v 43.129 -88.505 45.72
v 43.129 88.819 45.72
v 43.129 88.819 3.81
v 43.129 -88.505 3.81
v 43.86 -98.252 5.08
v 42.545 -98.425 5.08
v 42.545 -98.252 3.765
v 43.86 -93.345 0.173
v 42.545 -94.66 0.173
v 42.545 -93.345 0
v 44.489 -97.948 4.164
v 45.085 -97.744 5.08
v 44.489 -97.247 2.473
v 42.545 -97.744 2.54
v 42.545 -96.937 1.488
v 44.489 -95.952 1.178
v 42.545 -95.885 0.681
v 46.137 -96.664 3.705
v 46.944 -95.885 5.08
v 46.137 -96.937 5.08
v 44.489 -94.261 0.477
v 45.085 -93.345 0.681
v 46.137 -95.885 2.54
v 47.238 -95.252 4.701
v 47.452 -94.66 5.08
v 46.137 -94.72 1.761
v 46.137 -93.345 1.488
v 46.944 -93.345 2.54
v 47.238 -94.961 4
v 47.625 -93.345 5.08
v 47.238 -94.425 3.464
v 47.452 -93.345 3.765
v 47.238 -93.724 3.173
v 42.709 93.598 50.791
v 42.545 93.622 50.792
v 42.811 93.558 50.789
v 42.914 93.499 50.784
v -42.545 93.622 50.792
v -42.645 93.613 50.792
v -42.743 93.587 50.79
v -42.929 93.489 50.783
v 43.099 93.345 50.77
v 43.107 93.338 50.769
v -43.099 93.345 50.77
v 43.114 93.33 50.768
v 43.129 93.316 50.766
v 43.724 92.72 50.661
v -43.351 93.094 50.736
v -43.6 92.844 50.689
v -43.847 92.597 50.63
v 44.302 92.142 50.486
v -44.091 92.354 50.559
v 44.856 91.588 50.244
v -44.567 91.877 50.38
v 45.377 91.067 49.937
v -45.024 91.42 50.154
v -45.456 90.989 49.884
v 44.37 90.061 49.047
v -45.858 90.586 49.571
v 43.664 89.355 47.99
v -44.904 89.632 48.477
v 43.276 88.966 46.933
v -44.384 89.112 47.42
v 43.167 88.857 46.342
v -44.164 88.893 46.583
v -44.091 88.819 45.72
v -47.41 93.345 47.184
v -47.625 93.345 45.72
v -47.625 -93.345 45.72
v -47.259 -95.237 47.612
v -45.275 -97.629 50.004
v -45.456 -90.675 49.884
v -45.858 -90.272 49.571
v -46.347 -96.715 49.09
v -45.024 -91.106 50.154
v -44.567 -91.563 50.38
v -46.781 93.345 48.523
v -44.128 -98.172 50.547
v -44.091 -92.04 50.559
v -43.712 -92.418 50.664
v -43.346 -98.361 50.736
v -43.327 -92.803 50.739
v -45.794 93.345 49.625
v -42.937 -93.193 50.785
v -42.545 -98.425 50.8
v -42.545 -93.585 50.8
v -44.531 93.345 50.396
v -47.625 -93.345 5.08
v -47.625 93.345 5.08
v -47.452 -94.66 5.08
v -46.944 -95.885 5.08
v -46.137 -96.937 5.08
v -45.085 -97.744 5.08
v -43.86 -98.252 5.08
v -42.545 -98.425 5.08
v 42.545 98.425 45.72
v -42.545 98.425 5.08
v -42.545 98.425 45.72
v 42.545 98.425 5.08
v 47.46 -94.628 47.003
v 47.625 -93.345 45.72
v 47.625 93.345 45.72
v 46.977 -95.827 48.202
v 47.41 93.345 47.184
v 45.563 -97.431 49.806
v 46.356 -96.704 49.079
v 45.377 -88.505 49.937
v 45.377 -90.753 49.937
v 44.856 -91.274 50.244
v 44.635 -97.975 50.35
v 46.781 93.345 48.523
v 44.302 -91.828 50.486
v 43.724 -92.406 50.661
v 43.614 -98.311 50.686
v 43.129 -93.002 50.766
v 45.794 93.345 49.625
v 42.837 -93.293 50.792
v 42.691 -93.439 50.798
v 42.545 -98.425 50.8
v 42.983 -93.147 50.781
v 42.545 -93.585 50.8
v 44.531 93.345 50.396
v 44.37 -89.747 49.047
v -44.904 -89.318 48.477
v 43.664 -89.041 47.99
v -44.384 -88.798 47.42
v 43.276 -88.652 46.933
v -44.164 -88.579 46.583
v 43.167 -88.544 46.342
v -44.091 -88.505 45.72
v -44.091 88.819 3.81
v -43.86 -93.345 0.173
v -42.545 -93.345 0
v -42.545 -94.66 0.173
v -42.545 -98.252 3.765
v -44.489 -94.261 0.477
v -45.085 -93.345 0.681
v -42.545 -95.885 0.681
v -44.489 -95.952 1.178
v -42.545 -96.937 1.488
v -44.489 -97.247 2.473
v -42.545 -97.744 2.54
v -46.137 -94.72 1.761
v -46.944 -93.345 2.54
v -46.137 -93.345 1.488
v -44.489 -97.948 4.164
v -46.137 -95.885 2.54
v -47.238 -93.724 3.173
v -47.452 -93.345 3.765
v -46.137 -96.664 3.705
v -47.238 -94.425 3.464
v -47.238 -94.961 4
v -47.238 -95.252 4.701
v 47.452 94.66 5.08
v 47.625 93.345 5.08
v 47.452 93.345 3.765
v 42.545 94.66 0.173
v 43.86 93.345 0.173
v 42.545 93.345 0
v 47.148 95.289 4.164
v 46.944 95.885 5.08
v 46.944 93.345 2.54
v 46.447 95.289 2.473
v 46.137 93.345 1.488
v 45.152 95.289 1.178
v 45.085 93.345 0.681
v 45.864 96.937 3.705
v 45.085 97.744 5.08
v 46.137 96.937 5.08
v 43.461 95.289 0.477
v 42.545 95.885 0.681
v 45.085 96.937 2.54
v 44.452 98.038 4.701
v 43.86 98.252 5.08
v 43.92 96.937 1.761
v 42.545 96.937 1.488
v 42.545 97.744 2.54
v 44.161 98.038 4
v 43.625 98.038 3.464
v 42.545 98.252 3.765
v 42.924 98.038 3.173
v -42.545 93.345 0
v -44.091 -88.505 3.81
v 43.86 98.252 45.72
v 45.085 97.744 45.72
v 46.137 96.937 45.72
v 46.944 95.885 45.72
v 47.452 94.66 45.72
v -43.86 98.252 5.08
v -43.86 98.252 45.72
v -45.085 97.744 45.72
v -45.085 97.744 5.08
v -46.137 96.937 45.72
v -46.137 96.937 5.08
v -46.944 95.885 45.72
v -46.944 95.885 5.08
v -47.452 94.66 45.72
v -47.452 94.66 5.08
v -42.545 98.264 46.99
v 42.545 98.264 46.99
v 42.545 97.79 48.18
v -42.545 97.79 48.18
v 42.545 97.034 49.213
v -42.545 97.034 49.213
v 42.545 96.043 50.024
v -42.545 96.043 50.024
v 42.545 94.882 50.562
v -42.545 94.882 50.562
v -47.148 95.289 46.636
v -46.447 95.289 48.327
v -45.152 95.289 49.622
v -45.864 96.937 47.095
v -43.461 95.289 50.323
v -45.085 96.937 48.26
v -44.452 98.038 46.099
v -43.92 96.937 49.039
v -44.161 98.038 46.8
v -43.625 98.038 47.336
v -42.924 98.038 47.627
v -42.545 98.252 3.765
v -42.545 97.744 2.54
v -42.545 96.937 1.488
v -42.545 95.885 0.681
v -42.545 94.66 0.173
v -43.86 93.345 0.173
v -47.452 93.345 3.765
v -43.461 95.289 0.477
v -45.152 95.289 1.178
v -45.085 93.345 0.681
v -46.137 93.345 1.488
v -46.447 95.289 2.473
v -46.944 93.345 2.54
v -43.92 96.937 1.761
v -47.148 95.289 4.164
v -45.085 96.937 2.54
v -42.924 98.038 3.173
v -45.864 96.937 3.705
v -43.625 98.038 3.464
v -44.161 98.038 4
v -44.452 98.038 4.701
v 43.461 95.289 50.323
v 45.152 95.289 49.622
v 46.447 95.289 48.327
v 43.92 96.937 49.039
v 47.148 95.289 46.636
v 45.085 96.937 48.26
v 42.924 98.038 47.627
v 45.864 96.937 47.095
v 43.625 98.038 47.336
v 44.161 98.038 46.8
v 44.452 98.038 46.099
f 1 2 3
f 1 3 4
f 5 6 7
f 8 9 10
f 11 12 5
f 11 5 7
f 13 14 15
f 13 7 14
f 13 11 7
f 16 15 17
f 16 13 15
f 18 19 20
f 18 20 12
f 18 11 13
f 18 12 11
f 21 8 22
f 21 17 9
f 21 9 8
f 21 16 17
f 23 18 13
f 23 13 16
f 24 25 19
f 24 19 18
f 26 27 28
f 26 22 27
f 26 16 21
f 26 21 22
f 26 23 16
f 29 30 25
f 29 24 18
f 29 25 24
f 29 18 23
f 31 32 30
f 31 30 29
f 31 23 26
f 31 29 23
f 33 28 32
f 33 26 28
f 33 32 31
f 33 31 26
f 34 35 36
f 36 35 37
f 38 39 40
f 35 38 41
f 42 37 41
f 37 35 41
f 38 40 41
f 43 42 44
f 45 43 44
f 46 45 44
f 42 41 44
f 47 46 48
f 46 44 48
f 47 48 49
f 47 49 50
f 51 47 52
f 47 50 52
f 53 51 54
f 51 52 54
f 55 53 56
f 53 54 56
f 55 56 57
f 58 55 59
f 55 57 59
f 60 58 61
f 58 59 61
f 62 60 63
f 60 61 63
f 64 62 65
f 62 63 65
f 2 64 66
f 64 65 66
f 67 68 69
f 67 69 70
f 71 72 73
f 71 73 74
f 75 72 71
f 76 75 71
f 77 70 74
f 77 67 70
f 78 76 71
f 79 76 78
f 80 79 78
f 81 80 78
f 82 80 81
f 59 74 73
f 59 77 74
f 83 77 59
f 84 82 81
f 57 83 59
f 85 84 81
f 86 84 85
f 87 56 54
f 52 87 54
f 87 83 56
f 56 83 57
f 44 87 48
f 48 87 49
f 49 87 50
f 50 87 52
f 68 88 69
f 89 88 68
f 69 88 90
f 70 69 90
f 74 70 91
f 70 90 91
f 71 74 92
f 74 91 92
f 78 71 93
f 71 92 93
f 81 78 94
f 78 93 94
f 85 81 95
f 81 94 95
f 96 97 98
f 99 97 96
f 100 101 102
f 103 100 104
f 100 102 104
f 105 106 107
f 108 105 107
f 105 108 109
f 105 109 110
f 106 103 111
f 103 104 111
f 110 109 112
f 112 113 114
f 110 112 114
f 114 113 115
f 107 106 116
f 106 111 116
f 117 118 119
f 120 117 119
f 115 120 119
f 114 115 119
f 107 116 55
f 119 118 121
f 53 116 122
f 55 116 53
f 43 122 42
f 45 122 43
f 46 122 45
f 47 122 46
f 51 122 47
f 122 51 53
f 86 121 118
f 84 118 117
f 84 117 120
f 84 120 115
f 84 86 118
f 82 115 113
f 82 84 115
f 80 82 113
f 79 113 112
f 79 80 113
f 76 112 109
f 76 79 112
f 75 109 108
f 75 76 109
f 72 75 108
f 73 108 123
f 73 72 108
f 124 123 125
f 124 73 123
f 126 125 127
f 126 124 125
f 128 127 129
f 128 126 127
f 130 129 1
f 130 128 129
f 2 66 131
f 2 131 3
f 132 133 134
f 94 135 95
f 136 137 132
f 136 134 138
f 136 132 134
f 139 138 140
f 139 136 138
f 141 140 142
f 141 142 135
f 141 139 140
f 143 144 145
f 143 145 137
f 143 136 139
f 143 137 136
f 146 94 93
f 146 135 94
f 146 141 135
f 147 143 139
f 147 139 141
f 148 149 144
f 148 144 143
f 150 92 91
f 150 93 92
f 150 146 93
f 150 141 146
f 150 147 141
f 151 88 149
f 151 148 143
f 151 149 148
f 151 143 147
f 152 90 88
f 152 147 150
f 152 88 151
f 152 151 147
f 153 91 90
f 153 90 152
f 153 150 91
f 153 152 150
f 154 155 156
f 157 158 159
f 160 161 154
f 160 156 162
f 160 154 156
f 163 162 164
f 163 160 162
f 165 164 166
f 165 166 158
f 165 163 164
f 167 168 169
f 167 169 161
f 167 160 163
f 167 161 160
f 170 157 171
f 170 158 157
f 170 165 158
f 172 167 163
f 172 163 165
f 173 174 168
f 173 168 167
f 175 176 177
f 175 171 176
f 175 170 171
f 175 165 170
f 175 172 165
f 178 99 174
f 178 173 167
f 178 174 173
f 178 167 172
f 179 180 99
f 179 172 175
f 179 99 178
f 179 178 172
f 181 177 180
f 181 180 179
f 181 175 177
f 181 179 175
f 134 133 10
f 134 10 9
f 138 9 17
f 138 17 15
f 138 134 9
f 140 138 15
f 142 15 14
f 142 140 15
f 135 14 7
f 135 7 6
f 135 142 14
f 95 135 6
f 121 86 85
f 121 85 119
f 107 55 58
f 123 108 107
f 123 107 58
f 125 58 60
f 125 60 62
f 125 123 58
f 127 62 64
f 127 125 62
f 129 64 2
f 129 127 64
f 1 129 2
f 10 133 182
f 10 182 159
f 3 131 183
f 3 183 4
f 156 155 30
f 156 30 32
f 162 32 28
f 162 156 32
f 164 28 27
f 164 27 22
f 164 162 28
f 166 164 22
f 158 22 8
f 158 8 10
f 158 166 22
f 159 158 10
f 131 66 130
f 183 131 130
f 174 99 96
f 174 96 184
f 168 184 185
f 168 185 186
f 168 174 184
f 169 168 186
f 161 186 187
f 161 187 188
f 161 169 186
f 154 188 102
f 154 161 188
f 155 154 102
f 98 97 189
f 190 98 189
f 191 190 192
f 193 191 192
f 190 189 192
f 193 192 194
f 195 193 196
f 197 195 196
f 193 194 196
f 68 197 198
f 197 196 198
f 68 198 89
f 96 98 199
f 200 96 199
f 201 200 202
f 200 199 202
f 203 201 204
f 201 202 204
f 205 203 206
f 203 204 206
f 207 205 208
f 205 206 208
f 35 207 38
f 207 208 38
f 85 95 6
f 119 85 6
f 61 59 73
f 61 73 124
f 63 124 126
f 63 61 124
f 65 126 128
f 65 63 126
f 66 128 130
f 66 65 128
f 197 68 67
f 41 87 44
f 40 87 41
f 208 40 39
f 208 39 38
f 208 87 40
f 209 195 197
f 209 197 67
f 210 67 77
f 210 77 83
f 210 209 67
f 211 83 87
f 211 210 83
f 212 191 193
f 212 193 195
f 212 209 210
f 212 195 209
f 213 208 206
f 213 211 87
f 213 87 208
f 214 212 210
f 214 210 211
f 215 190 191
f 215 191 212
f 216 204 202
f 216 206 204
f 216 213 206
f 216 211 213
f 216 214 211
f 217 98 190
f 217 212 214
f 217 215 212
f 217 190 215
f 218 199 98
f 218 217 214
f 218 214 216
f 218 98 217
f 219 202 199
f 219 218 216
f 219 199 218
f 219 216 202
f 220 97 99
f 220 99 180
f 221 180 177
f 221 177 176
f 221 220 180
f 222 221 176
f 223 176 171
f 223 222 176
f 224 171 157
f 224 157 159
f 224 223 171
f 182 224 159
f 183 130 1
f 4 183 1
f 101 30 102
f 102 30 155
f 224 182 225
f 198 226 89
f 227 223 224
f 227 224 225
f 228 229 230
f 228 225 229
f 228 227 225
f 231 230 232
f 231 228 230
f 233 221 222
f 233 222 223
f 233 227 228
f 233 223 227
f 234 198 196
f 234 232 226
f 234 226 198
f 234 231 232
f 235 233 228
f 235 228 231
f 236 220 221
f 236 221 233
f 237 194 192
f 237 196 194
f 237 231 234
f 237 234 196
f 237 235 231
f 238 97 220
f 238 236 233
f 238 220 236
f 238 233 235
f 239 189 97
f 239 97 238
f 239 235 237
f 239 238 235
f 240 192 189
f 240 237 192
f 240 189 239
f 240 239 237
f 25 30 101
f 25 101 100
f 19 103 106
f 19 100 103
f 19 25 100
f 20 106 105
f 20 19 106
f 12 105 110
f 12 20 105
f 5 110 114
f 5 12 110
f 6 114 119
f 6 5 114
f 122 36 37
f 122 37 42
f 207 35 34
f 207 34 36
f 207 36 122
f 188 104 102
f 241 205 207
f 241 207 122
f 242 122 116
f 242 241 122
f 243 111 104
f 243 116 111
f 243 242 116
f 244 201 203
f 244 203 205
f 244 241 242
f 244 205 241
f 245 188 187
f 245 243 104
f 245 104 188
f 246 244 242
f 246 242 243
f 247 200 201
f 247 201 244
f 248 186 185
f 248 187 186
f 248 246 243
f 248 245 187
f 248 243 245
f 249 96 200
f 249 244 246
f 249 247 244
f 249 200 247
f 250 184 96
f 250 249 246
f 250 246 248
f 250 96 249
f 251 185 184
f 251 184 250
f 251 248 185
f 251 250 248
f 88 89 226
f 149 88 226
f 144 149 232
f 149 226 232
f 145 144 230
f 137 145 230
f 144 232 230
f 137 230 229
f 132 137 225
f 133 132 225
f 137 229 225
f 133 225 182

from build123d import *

# Parameters (mm, degrees)
F0_W          = 95.25
F0_H          = 196.85
F1_DEPTH      = 50.8
F2_W          = 87.2193016112
F2_H          = 177.3245334625
F3_DEPTH      = 46.99
F4_T1_DEPTH   = 204.47
F4_T3_DEPTH   = 85.09
F4_T5_DEPTH   = 40.64
F4_T7_DEPTH   = 186.69
F4_T9_DEPTH   = 58.42
F4_T11_DEPTH  = 87.2193016112
F4_T13_DEPTH  = 177.3245334625
F4_S17_W      = 5.1816
F4_S17_H      = 5.1816
F4_T18_DEPTH  = 5.1816
F4_S23_W      = 5.1816
F4_S23_H      = 5.1816
F4_T24_DEPTH  = 5.1816
F4_S29_W      = 5.1816
F4_S29_H      = 5.1816
F4_T30_DEPTH  = 5.1816
F4_S35_W      = 5.1816
F4_S35_H      = 5.1816
F4_T36_DEPTH  = 5.1816
F4_S41_W      = 5.1816
F4_S41_H      = 5.1816
F4_T42_DEPTH  = 5.1816
F4_S47_W      = 5.1816
F4_S47_H      = 5.1816
F4_T48_DEPTH  = 5.1816
F4_T55_DEPTH  = 99.9193016112
F4_T60_DEPTH  = 190.0245334625
F4_T69_DEPTH  = 99.9193016112
F4_T74_DEPTH  = 190.0245334625
F4_T83_DEPTH  = 190.0245334625
F4_T89_DEPTH  = 99.9193016112
F4_T97_DEPTH  = 99.9193016112
F4_T102_DEPTH = 190.0245334625


# Not quite as in the source:
# - a fillet or chamfer that OpenCascade refuses, or shapes differently, is made with other operations: its cross-section is extruded or revolved along the edge and cut away or added


with BuildPart() as f1:
    # F0 (on Top) → F1 (new body)
    with BuildSketch(Plane.XY):
        Rectangle(F0_W, F0_H)
    extrude(amount=F1_DEPTH)

    # F2 (on face) → F3 (cut)
    with BuildSketch(Plane.XY.offset(50.8)):
        with Locations((-0.4809889942, 0.1569911838)):
            Rectangle(F2_W, F2_H)
    extrude(amount=-F3_DEPTH, mode=Mode.SUBTRACT)

    # F4: fillet of radius 5.08 on 15 edges, made by hand

    # F4_s2 → F4_t1 (cut)
    with BuildSketch(Plane.XZ.offset(-93.345)):
        with BuildLine():
            ThreePointArc((-47.625, 45.72), (-46.1371024484, 49.3121024484), (-42.545, 50.8))
            Line((-42.545, 50.8), (-47.625, 50.8))
            Line((-47.625, 50.8), (-47.625, 45.72))
        make_face()
        with BuildLine():
            ThreePointArc((47.625, 45.72), (46.1371024484, 49.3121024484), (42.545, 50.8))
            Line((42.545, 50.8), (47.625, 50.8))
            Line((47.625, 50.8), (47.625, 45.72))
        make_face()
    extrude(amount=F4_T1_DEPTH, mode=Mode.SUBTRACT)

    # F4_s4 → F4_t3 (cut)
    with BuildSketch(Plane.YZ.offset(-42.545)):
        with BuildLine():
            ThreePointArc((98.425, 45.72), (96.9371024484, 49.3121024484), (93.345, 50.8))
            Line((93.345, 50.8), (98.425, 50.8))
            Line((98.425, 50.8), (98.425, 45.72))
        make_face()
        with BuildLine():
            ThreePointArc((-93.345, 0), (-96.9371024484, 1.4878975516), (-98.425, 5.08))
            Line((-98.425, 5.08), (-98.425, 0))
            Line((-98.425, 0), (-93.345, 0))
        make_face()
        with BuildLine():
            ThreePointArc((98.425, 5.08), (96.9371024484, 1.4878975516), (93.345, 0))
            Line((93.345, 0), (98.425, 0))
            Line((98.425, 0), (98.425, 5.08))
        make_face()
    extrude(amount=F4_T3_DEPTH, mode=Mode.SUBTRACT)

    # F4_s6 → F4_t5 (cut)
    with BuildSketch(Plane.XY.offset(5.08)):
        with BuildLine():
            ThreePointArc((-42.545, 98.425), (-46.1371024484, 96.9371024484), (-47.625, 93.345))
            Line((-47.625, 93.345), (-47.625, 98.425))
            Line((-47.625, 98.425), (-42.545, 98.425))
        make_face()
        with BuildLine():
            ThreePointArc((42.545, 98.425), (46.1371024484, 96.9371024484), (47.625, 93.345))
            Line((47.625, 93.345), (47.625, 98.425))
            Line((47.625, 98.425), (42.545, 98.425))
        make_face()
    extrude(amount=F4_T5_DEPTH, mode=Mode.SUBTRACT)

    # F4_s8 → F4_t7 (cut)
    with BuildSketch(Plane.XZ.offset(-93.345)):
        with BuildLine():
            ThreePointArc((-47.625, 5.08), (-46.1371024484, 1.4878975516), (-42.545, 0))
            Line((-42.545, 0), (-47.625, 0))
            Line((-47.625, 0), (-47.625, 5.08))
        make_face()
        with BuildLine():
            ThreePointArc((47.625, 5.08), (46.1371024484, 1.4878975516), (42.545, 0))
            Line((42.545, 0), (47.625, 0))
            Line((47.625, 0), (47.625, 5.08))
        make_face()
    extrude(amount=F4_T7_DEPTH, mode=Mode.SUBTRACT)

    # F4_s10 → F4_t9 (cut)
    with BuildSketch(Plane.XY.offset(5.08)):
        with BuildLine():
            ThreePointArc((-47.625, -93.345), (-46.1371024484, -96.9371024484), (-42.545, -98.425))
            Line((-42.545, -98.425), (-47.625, -98.425))
            Line((-47.625, -98.425), (-47.625, -93.345))
        make_face()
        with BuildLine():
            ThreePointArc((47.625, -93.345), (46.1371024484, -96.9371024484), (42.545, -98.425))
            Line((42.545, -98.425), (47.625, -98.425))
            Line((47.625, -98.425), (47.625, -93.345))
        make_face()
    extrude(amount=F4_T9_DEPTH, mode=Mode.SUBTRACT)

    # F4_s12 → F4_t11 (cut)
    with BuildSketch(Plane.YZ.offset(-44.0906397998)):
        with BuildLine():
            ThreePointArc((93.899257915, 50.8), (90.3071554666, 49.3121024484), (88.819257915, 45.72))
            Line((88.819257915, 45.72), (88.819257915, 50.8))
            Line((88.819257915, 50.8), (93.899257915, 50.8))
        make_face()
        with BuildLine():
            ThreePointArc((-93.5852755475, 50.8), (-89.9931730991, 49.3121024484), (-88.5052755475, 45.72))
            Line((-88.5052755475, 45.72), (-88.5052755475, 50.8))
            Line((-88.5052755475, 50.8), (-93.5852755475, 50.8))
        make_face()
    extrude(amount=F4_T11_DEPTH, mode=Mode.SUBTRACT)

    # F4_s14 → F4_t13 (cut)
    with BuildSketch(Plane.XZ.offset(-88.819257915)):
        with BuildLine():
            ThreePointArc((-49.1706397998, 50.8), (-45.5785373514, 49.3121024484), (-44.0906397998, 45.72))
            Line((-44.0906397998, 45.72), (-44.0906397998, 50.8))
            Line((-44.0906397998, 50.8), (-49.1706397998, 50.8))
        make_face()
        with BuildLine():
            ThreePointArc((48.2086618114, 50.8), (44.6165593629, 49.3121024484), (43.1286618114, 45.72))
            Line((43.1286618114, 45.72), (43.1286618114, 50.8))
            Line((43.1286618114, 50.8), (48.2086618114, 50.8))
        make_face()
    extrude(amount=F4_T13_DEPTH, mode=Mode.SUBTRACT)


with BuildPart() as f4_tool16:
    # F4_s17 → F4_t18 (new body)
    with BuildSketch(Plane.XZ.offset(-93.345)):
        with Locations((-45.1358, 48.3108)):
            Rectangle(F4_S17_W, F4_S17_H)
    extrude(amount=-F4_T18_DEPTH)

    # F4_s19 → F4_t20 (revolve, cut)
    with BuildSketch(Plane(origin=(-42.545, 93.345, 45.72), x_dir=(0.7071067812, 0, -0.7071067812), z_dir=(0.7071067812, 0, 0.7071067812))):
        with BuildLine():
            ThreePointArc((0, -5.08), (5.08, 0), (0, 5.08))
            Line((0, 5.08), (0, -5.08))
        make_face()
    revolve(axis=Axis((-42.545, 93.345, 45.72), (0, 1, 0)), mode=Mode.SUBTRACT)


with BuildPart() as f1_1:
    add(f1.part)

    # F4_t15: cut F4_tool16
    add(f4_tool16.part, mode=Mode.SUBTRACT)


with BuildPart() as f4_tool22:
    # F4_s23 → F4_t24 (new body)
    with BuildSketch(Plane.XZ.offset(-93.345)):
        with Locations((45.1358, 48.3108)):
            Rectangle(F4_S23_W, F4_S23_H)
    extrude(amount=-F4_T24_DEPTH)

    # F4_s25 → F4_t26 (revolve, cut)
    with BuildSketch(Plane(origin=(42.545, 93.345, 45.72), x_dir=(-0.7071067812, 0, -0.7071067812), z_dir=(0.7071067812, 0, -0.7071067812))):
        with BuildLine():
            ThreePointArc((0, -5.08), (5.08, 0), (0, 5.08))
            Line((0, 5.08), (0, -5.08))
        make_face()
    revolve(axis=Axis((42.545, 93.345, 45.72), (0, 1, 0)), mode=Mode.SUBTRACT)


with BuildPart() as f1_2:
    add(f1_1.part)

    # F4_t21: cut F4_tool22
    add(f4_tool22.part, mode=Mode.SUBTRACT)


with BuildPart() as f4_tool28:
    # F4_s29 → F4_t30 (new body)
    with BuildSketch(Plane.XZ.offset(-93.345)):
        with Locations((-45.1358, 2.4892)):
            Rectangle(F4_S29_W, F4_S29_H)
    extrude(amount=-F4_T30_DEPTH)

    # F4_s31 → F4_t32 (revolve, cut)
    with BuildSketch(Plane(origin=(-42.545, 93.345, 5.08), x_dir=(0.7071067812, 0, 0.7071067812), z_dir=(-0.7071067812, 0, 0.7071067812))):
        with BuildLine():
            ThreePointArc((0, -5.08), (5.08, 0), (0, 5.08))
            Line((0, 5.08), (0, -5.08))
        make_face()
    revolve(axis=Axis((-42.545, 93.345, 5.08), (0, 1, 0)), mode=Mode.SUBTRACT)


with BuildPart() as f1_3:
    add(f1_2.part)

    # F4_t27: cut F4_tool28
    add(f4_tool28.part, mode=Mode.SUBTRACT)


with BuildPart() as f4_tool34:
    # F4_s35 → F4_t36 (new body)
    with BuildSketch(Plane.YZ.offset(-42.545)):
        with Locations((-95.9358, 2.4892)):
            Rectangle(F4_S35_W, F4_S35_H)
    extrude(amount=-F4_T36_DEPTH)

    # F4_s37 → F4_t38 (revolve, cut)
    with BuildSketch(Plane(origin=(-42.545, -93.345, 5.08), x_dir=(0, 0.7071067812, 0.7071067812), z_dir=(0, -0.7071067812, 0.7071067812))):
        with BuildLine():
            ThreePointArc((0, -5.08), (5.08, 0), (0, 5.08))
            Line((0, 5.08), (0, -5.08))
        make_face()
    revolve(axis=Axis((-42.545, -93.345, 5.08), (-1, 0, 0)), mode=Mode.SUBTRACT)


with BuildPart() as f1_4:
    add(f1_3.part)

    # F4_t33: cut F4_tool34
    add(f4_tool34.part, mode=Mode.SUBTRACT)


with BuildPart() as f4_tool40:
    # F4_s41 → F4_t42 (new body)
    with BuildSketch(Plane.YZ.offset(42.545)):
        with Locations((-95.9358, 2.4892)):
            Rectangle(F4_S41_W, F4_S41_H)
    extrude(amount=F4_T42_DEPTH)

    # F4_s43 → F4_t44 (revolve, cut)
    with BuildSketch(Plane(origin=(42.545, -93.345, 5.08), x_dir=(0, 0.7071067812, 0.7071067812), z_dir=(0, 0.7071067812, -0.7071067812))):
        with BuildLine():
            ThreePointArc((0, -5.08), (5.08, 0), (0, 5.08))
            Line((0, 5.08), (0, -5.08))
        make_face()
    revolve(axis=Axis((42.545, -93.345, 5.08), (1, 0, 0)), mode=Mode.SUBTRACT)


with BuildPart() as f1_5:
    add(f1_4.part)

    # F4_t39: cut F4_tool40
    add(f4_tool40.part, mode=Mode.SUBTRACT)


with BuildPart() as f4_tool46:
    # F4_s47 → F4_t48 (new body)
    with BuildSketch(Plane.XZ.offset(-93.345)):
        with Locations((45.1358, 2.4892)):
            Rectangle(F4_S47_W, F4_S47_H)
    extrude(amount=-F4_T48_DEPTH)

    # F4_s49 → F4_t50 (revolve, cut)
    with BuildSketch(Plane(origin=(42.545, 93.345, 5.08), x_dir=(-0.7071067812, 0, 0.7071067812), z_dir=(-0.7071067812, 0, -0.7071067812))):
        with BuildLine():
            ThreePointArc((0, -5.08), (5.08, 0), (0, 5.08))
            Line((0, 5.08), (0, -5.08))
        make_face()
    revolve(axis=Axis((42.545, 93.345, 5.08), (0, 1, 0)), mode=Mode.SUBTRACT)


with BuildPart() as f1_6:
    add(f1_5.part)

    # F4_t45: cut F4_tool46
    add(f4_tool46.part, mode=Mode.SUBTRACT)


with BuildPart() as f4_tool53:
    # F4_s54 → F4_t55 (new body)
    with BuildSketch(Plane.YZ.offset(55.8286618114)):
        with BuildLine():
            ThreePointArc((93.899257915, 50.8), (90.3071554666, 49.3121024484), (88.819257915, 45.72))
            Line((88.819257915, 45.72), (88.819257915, 50.8))
            Line((88.819257915, 50.8), (93.899257915, 50.8))
        make_face()
    extrude(amount=-F4_T55_DEPTH)

    split(bisect_by=Plane.YZ.offset(47.625), keep=Keep.BOTTOM)

    split(bisect_by=Plane.YZ.offset(43.1286618114), keep=Keep.TOP)


with BuildPart() as f4_tool58:
    # F4_s59 → F4_t60 (new body)
    with BuildSketch(Plane.XZ.offset(88.5052755475)):
        with BuildLine():
            ThreePointArc((48.2086618114, 50.8), (44.6165593629, 49.3121024484), (43.1286618114, 45.72))
            Line((43.1286618114, 45.72), (43.1286618114, 50.8))
            Line((43.1286618114, 50.8), (48.2086618114, 50.8))
        make_face()
    extrude(amount=-F4_T60_DEPTH)

    split(bisect_by=Plane.XZ.offset(-98.425), keep=Keep.TOP)

    split(bisect_by=Plane.YZ.offset(47.625), keep=Keep.BOTTOM)

    split(bisect_by=Plane.XZ.offset(-88.819257915), keep=Keep.BOTTOM)


with BuildPart() as f4_tool53_1:
    add(f4_tool53.part)

    # F4_t64: intersect F4_tool58
    add(f4_tool58.part, mode=Mode.INTERSECT)


with BuildPart() as f1_7:
    add(f1_6.part)

    # F4_t51: cut F4_tool53
    add(f4_tool53_1.part, mode=Mode.SUBTRACT)


with BuildPart() as f4_tool67:
    # F4_s68 → F4_t69 (new body)
    with BuildSketch(Plane.YZ.offset(43.1286618114)):
        with BuildLine():
            ThreePointArc((93.899257915, 50.8), (90.3071554666, 49.3121024484), (88.819257915, 45.72))
            Line((88.819257915, 45.72), (88.819257915, 50.8))
            Line((88.819257915, 50.8), (93.899257915, 50.8))
        make_face()
    extrude(amount=-F4_T69_DEPTH)

    split(bisect_by=Plane.YZ.offset(-47.625), keep=Keep.TOP)

    split(bisect_by=Plane.YZ.offset(-44.0906397998), keep=Keep.BOTTOM)


with BuildPart() as f4_tool72:
    # F4_s73 → F4_t74 (new body)
    with BuildSketch(Plane.XZ.offset(-101.519257915)):
        with BuildLine():
            ThreePointArc((-49.1706397998, 50.8), (-45.5785373514, 49.3121024484), (-44.0906397998, 45.72))
            Line((-44.0906397998, 45.72), (-44.0906397998, 50.8))
            Line((-44.0906397998, 50.8), (-49.1706397998, 50.8))
        make_face()
    extrude(amount=F4_T74_DEPTH)

    split(bisect_by=Plane.XZ.offset(-98.425), keep=Keep.TOP)

    split(bisect_by=Plane.YZ.offset(-47.625), keep=Keep.TOP)

    split(bisect_by=Plane.XZ.offset(-88.819257915), keep=Keep.BOTTOM)


with BuildPart() as f4_tool67_1:
    add(f4_tool67.part)

    # F4_t78: intersect F4_tool72
    add(f4_tool72.part, mode=Mode.INTERSECT)


with BuildPart() as f1_8:
    add(f1_7.part)

    # F4_t65: cut F4_tool67
    add(f4_tool67_1.part, mode=Mode.SUBTRACT)


with BuildPart() as f4_tool81:
    # F4_s82 → F4_t83 (new body)
    with BuildSketch(Plane.XZ.offset(-88.819257915)):
        with BuildLine():
            ThreePointArc((-49.1706397998, 50.8), (-45.5785373514, 49.3121024484), (-44.0906397998, 45.72))
            Line((-44.0906397998, 45.72), (-44.0906397998, 50.8))
            Line((-44.0906397998, 50.8), (-49.1706397998, 50.8))
        make_face()
    extrude(amount=F4_T83_DEPTH)

    split(bisect_by=Plane.YZ.offset(-47.625), keep=Keep.TOP)

    split(bisect_by=Plane.XZ.offset(98.425), keep=Keep.BOTTOM)

    split(bisect_by=Plane.XZ.offset(88.5052755475), keep=Keep.TOP)


with BuildPart() as f4_tool87:
    # F4_s88 → F4_t89 (new body)
    with BuildSketch(Plane.YZ.offset(-56.7906397998)):
        with BuildLine():
            ThreePointArc((-93.5852755475, 50.8), (-89.9931730991, 49.3121024484), (-88.5052755475, 45.72))
            Line((-88.5052755475, 45.72), (-88.5052755475, 50.8))
            Line((-88.5052755475, 50.8), (-93.5852755475, 50.8))
        make_face()
    extrude(amount=F4_T89_DEPTH)

    split(bisect_by=Plane.YZ.offset(-47.625), keep=Keep.TOP)

    split(bisect_by=Plane.YZ.offset(-44.0906397998), keep=Keep.BOTTOM)


with BuildPart() as f4_tool81_1:
    add(f4_tool81.part)

    # F4_t92: intersect F4_tool87
    add(f4_tool87.part, mode=Mode.INTERSECT)


with BuildPart() as f1_9:
    add(f1_8.part)

    # F4_t79: cut F4_tool81
    add(f4_tool81_1.part, mode=Mode.SUBTRACT)


with BuildPart() as f4_tool95:
    # F4_s96 → F4_t97 (new body)
    with BuildSketch(Plane.YZ.offset(-44.0906397998)):
        with BuildLine():
            ThreePointArc((-93.5852755475, 50.8), (-89.9931730991, 49.3121024484), (-88.5052755475, 45.72))
            Line((-88.5052755475, 45.72), (-88.5052755475, 50.8))
            Line((-88.5052755475, 50.8), (-93.5852755475, 50.8))
        make_face()
    extrude(amount=F4_T97_DEPTH)

    split(bisect_by=Plane.YZ.offset(47.625), keep=Keep.BOTTOM)

    split(bisect_by=Plane.YZ.offset(43.1286618114), keep=Keep.TOP)


with BuildPart() as f4_tool100:
    # F4_s101 → F4_t102 (new body)
    with BuildSketch(Plane.XZ.offset(101.2052755475)):
        with BuildLine():
            ThreePointArc((48.2086618114, 50.8), (44.6165593629, 49.3121024484), (43.1286618114, 45.72))
            Line((43.1286618114, 45.72), (43.1286618114, 50.8))
            Line((43.1286618114, 50.8), (48.2086618114, 50.8))
        make_face()
    extrude(amount=-F4_T102_DEPTH)

    split(bisect_by=Plane.YZ.offset(47.625), keep=Keep.BOTTOM)

    split(bisect_by=Plane.XZ.offset(98.425), keep=Keep.BOTTOM)

    split(bisect_by=Plane.XZ.offset(88.5052755475), keep=Keep.TOP)


with BuildPart() as f4_tool95_1:
    add(f4_tool95.part)

    # F4_t106: intersect F4_tool100
    add(f4_tool100.part, mode=Mode.INTERSECT)


with BuildPart() as f1_10:
    add(f1_9.part)

    # F4_t93: cut F4_tool95
    add(f4_tool95_1.part, mode=Mode.SUBTRACT)


solid = f1_10.part
